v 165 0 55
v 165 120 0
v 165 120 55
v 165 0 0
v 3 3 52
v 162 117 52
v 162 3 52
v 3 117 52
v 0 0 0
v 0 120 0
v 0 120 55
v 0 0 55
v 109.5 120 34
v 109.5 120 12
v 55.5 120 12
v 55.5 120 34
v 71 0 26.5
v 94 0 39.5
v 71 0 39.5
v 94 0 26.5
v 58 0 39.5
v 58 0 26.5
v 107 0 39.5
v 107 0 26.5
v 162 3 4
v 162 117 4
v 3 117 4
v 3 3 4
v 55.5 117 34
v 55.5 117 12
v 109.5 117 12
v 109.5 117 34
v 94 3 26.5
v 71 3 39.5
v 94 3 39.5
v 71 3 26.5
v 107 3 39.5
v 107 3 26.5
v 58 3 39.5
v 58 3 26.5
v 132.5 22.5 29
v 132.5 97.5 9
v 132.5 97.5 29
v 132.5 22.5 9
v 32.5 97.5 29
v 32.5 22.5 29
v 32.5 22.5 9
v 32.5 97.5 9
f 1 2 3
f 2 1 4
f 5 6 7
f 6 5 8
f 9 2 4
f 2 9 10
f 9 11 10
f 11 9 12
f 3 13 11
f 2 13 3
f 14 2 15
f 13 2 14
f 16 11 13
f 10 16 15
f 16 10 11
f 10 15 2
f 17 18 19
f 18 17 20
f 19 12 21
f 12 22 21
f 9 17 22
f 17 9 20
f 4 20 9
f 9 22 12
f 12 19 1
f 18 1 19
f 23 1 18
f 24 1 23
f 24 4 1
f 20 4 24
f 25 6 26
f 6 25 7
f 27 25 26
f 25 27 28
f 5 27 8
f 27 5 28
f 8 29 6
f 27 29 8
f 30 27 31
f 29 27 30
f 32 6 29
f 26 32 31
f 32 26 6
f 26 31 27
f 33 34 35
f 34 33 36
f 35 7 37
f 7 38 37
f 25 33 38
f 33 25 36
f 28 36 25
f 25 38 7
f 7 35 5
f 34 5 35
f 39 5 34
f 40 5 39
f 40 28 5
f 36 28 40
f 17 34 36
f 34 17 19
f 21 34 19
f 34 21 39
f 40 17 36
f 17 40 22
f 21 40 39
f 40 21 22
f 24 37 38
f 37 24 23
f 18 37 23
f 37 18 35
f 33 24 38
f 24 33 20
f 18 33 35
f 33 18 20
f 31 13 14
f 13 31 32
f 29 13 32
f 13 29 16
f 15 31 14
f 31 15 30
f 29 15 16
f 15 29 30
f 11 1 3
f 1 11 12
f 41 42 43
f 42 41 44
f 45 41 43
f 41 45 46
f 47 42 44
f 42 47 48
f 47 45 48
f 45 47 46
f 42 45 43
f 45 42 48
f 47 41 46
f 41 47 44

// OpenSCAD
// Exploratory enclosure concept, NOT DIMENSIONALLY VERIFIED OR PRINT-READY.
// Radxa ROCK 5B board envelope is 100x75 mm according to official docs.
// All camera, mounting, cutout, thermal, wiring and battery details are TBD.
// Inspect with OpenSCAD (part="assembly") or preview "base"/"lid" separately.
// https://docs.radxa.com/en/rock5/rock5b/getting-started/introduction

$fn = 40;
part = "assembly";     // [assembly,base,lid]
show_board_envelope = true;

// Deliberately oversized discovery prototype (mm) -- NOT a final dimension.
outer_x = 165;
outer_y = 120;
outer_z = 55;
wall = 3;
floor_t = 4;
lid_t = 3;

board_x = 100;
board_y = 75;
board_z = 20;          // tentative component-height envelope; measure actual
board_base_z = 9;      // reference only, no mechanical mounts fabricated

rgb_opening = 13;      // nominal camera aperture, NOT optically qualified
nir_opening = 13;
opening_pitch = 36;
opening_height = 33;

assert(outer_x > board_x + 2*wall + 10, "X clearance too small");
assert(outer_y > board_y + 2*wall + 10, "Y clearance too small");
assert(outer_z > board_base_z + board_z + lid_t + 3, "Z clearance too small");
assert(wall >= 2 && floor_t >= 3, "Unsupported wall/floor sizing");

module camera_window(xpos) {
    translate([xpos-rgb_opening/2,-0.5,opening_height-rgb_opening/2])
        cube([rgb_opening,wall+1, rgb_opening]);
}

module base_shell() {
    difference() {
        cube([outer_x,outer_y,outer_z-lid_t]);
        translate([wall,wall,floor_t])
            cube([outer_x-2*wall,outer_y-2*wall,outer_z-floor_t-lid_t+0.2]);
        // Camera cutouts: actual camera location, NIR windows and safety TBD
        camera_window(outer_x/2-opening_pitch/2);
        camera_window(outer_x/2+opening_pitch/2);
        // Rear connector clearance is only a broad assembly placeholder.
        translate([outer_x/2-27,outer_y-wall-0.5,12])
            cube([54,wall+1,22]);
    }
}

module top_lid() {
    // Plain cap, no snaps, screws, weather seal or fitting lips.
    cube([outer_x,outer_y,lid_t]);
}

module placeholder_board() {
    color([0,0.5,0.2,0.45])
        translate([(outer_x-board_x)/2,(outer_y-board_y)/2,board_base_z])
        cube([board_x,board_y,board_z]);
}

if (part == "base") base_shell();
else if (part == "lid") top_lid();
else {
    color([0.85,0.85,0.88,0.35]) base_shell();
    color([0.65,0.65,0.75,0.45]) translate([0,0,outer_z-lid_t]) top_lid();
    if (show_board_envelope) placeholder_board();
}
